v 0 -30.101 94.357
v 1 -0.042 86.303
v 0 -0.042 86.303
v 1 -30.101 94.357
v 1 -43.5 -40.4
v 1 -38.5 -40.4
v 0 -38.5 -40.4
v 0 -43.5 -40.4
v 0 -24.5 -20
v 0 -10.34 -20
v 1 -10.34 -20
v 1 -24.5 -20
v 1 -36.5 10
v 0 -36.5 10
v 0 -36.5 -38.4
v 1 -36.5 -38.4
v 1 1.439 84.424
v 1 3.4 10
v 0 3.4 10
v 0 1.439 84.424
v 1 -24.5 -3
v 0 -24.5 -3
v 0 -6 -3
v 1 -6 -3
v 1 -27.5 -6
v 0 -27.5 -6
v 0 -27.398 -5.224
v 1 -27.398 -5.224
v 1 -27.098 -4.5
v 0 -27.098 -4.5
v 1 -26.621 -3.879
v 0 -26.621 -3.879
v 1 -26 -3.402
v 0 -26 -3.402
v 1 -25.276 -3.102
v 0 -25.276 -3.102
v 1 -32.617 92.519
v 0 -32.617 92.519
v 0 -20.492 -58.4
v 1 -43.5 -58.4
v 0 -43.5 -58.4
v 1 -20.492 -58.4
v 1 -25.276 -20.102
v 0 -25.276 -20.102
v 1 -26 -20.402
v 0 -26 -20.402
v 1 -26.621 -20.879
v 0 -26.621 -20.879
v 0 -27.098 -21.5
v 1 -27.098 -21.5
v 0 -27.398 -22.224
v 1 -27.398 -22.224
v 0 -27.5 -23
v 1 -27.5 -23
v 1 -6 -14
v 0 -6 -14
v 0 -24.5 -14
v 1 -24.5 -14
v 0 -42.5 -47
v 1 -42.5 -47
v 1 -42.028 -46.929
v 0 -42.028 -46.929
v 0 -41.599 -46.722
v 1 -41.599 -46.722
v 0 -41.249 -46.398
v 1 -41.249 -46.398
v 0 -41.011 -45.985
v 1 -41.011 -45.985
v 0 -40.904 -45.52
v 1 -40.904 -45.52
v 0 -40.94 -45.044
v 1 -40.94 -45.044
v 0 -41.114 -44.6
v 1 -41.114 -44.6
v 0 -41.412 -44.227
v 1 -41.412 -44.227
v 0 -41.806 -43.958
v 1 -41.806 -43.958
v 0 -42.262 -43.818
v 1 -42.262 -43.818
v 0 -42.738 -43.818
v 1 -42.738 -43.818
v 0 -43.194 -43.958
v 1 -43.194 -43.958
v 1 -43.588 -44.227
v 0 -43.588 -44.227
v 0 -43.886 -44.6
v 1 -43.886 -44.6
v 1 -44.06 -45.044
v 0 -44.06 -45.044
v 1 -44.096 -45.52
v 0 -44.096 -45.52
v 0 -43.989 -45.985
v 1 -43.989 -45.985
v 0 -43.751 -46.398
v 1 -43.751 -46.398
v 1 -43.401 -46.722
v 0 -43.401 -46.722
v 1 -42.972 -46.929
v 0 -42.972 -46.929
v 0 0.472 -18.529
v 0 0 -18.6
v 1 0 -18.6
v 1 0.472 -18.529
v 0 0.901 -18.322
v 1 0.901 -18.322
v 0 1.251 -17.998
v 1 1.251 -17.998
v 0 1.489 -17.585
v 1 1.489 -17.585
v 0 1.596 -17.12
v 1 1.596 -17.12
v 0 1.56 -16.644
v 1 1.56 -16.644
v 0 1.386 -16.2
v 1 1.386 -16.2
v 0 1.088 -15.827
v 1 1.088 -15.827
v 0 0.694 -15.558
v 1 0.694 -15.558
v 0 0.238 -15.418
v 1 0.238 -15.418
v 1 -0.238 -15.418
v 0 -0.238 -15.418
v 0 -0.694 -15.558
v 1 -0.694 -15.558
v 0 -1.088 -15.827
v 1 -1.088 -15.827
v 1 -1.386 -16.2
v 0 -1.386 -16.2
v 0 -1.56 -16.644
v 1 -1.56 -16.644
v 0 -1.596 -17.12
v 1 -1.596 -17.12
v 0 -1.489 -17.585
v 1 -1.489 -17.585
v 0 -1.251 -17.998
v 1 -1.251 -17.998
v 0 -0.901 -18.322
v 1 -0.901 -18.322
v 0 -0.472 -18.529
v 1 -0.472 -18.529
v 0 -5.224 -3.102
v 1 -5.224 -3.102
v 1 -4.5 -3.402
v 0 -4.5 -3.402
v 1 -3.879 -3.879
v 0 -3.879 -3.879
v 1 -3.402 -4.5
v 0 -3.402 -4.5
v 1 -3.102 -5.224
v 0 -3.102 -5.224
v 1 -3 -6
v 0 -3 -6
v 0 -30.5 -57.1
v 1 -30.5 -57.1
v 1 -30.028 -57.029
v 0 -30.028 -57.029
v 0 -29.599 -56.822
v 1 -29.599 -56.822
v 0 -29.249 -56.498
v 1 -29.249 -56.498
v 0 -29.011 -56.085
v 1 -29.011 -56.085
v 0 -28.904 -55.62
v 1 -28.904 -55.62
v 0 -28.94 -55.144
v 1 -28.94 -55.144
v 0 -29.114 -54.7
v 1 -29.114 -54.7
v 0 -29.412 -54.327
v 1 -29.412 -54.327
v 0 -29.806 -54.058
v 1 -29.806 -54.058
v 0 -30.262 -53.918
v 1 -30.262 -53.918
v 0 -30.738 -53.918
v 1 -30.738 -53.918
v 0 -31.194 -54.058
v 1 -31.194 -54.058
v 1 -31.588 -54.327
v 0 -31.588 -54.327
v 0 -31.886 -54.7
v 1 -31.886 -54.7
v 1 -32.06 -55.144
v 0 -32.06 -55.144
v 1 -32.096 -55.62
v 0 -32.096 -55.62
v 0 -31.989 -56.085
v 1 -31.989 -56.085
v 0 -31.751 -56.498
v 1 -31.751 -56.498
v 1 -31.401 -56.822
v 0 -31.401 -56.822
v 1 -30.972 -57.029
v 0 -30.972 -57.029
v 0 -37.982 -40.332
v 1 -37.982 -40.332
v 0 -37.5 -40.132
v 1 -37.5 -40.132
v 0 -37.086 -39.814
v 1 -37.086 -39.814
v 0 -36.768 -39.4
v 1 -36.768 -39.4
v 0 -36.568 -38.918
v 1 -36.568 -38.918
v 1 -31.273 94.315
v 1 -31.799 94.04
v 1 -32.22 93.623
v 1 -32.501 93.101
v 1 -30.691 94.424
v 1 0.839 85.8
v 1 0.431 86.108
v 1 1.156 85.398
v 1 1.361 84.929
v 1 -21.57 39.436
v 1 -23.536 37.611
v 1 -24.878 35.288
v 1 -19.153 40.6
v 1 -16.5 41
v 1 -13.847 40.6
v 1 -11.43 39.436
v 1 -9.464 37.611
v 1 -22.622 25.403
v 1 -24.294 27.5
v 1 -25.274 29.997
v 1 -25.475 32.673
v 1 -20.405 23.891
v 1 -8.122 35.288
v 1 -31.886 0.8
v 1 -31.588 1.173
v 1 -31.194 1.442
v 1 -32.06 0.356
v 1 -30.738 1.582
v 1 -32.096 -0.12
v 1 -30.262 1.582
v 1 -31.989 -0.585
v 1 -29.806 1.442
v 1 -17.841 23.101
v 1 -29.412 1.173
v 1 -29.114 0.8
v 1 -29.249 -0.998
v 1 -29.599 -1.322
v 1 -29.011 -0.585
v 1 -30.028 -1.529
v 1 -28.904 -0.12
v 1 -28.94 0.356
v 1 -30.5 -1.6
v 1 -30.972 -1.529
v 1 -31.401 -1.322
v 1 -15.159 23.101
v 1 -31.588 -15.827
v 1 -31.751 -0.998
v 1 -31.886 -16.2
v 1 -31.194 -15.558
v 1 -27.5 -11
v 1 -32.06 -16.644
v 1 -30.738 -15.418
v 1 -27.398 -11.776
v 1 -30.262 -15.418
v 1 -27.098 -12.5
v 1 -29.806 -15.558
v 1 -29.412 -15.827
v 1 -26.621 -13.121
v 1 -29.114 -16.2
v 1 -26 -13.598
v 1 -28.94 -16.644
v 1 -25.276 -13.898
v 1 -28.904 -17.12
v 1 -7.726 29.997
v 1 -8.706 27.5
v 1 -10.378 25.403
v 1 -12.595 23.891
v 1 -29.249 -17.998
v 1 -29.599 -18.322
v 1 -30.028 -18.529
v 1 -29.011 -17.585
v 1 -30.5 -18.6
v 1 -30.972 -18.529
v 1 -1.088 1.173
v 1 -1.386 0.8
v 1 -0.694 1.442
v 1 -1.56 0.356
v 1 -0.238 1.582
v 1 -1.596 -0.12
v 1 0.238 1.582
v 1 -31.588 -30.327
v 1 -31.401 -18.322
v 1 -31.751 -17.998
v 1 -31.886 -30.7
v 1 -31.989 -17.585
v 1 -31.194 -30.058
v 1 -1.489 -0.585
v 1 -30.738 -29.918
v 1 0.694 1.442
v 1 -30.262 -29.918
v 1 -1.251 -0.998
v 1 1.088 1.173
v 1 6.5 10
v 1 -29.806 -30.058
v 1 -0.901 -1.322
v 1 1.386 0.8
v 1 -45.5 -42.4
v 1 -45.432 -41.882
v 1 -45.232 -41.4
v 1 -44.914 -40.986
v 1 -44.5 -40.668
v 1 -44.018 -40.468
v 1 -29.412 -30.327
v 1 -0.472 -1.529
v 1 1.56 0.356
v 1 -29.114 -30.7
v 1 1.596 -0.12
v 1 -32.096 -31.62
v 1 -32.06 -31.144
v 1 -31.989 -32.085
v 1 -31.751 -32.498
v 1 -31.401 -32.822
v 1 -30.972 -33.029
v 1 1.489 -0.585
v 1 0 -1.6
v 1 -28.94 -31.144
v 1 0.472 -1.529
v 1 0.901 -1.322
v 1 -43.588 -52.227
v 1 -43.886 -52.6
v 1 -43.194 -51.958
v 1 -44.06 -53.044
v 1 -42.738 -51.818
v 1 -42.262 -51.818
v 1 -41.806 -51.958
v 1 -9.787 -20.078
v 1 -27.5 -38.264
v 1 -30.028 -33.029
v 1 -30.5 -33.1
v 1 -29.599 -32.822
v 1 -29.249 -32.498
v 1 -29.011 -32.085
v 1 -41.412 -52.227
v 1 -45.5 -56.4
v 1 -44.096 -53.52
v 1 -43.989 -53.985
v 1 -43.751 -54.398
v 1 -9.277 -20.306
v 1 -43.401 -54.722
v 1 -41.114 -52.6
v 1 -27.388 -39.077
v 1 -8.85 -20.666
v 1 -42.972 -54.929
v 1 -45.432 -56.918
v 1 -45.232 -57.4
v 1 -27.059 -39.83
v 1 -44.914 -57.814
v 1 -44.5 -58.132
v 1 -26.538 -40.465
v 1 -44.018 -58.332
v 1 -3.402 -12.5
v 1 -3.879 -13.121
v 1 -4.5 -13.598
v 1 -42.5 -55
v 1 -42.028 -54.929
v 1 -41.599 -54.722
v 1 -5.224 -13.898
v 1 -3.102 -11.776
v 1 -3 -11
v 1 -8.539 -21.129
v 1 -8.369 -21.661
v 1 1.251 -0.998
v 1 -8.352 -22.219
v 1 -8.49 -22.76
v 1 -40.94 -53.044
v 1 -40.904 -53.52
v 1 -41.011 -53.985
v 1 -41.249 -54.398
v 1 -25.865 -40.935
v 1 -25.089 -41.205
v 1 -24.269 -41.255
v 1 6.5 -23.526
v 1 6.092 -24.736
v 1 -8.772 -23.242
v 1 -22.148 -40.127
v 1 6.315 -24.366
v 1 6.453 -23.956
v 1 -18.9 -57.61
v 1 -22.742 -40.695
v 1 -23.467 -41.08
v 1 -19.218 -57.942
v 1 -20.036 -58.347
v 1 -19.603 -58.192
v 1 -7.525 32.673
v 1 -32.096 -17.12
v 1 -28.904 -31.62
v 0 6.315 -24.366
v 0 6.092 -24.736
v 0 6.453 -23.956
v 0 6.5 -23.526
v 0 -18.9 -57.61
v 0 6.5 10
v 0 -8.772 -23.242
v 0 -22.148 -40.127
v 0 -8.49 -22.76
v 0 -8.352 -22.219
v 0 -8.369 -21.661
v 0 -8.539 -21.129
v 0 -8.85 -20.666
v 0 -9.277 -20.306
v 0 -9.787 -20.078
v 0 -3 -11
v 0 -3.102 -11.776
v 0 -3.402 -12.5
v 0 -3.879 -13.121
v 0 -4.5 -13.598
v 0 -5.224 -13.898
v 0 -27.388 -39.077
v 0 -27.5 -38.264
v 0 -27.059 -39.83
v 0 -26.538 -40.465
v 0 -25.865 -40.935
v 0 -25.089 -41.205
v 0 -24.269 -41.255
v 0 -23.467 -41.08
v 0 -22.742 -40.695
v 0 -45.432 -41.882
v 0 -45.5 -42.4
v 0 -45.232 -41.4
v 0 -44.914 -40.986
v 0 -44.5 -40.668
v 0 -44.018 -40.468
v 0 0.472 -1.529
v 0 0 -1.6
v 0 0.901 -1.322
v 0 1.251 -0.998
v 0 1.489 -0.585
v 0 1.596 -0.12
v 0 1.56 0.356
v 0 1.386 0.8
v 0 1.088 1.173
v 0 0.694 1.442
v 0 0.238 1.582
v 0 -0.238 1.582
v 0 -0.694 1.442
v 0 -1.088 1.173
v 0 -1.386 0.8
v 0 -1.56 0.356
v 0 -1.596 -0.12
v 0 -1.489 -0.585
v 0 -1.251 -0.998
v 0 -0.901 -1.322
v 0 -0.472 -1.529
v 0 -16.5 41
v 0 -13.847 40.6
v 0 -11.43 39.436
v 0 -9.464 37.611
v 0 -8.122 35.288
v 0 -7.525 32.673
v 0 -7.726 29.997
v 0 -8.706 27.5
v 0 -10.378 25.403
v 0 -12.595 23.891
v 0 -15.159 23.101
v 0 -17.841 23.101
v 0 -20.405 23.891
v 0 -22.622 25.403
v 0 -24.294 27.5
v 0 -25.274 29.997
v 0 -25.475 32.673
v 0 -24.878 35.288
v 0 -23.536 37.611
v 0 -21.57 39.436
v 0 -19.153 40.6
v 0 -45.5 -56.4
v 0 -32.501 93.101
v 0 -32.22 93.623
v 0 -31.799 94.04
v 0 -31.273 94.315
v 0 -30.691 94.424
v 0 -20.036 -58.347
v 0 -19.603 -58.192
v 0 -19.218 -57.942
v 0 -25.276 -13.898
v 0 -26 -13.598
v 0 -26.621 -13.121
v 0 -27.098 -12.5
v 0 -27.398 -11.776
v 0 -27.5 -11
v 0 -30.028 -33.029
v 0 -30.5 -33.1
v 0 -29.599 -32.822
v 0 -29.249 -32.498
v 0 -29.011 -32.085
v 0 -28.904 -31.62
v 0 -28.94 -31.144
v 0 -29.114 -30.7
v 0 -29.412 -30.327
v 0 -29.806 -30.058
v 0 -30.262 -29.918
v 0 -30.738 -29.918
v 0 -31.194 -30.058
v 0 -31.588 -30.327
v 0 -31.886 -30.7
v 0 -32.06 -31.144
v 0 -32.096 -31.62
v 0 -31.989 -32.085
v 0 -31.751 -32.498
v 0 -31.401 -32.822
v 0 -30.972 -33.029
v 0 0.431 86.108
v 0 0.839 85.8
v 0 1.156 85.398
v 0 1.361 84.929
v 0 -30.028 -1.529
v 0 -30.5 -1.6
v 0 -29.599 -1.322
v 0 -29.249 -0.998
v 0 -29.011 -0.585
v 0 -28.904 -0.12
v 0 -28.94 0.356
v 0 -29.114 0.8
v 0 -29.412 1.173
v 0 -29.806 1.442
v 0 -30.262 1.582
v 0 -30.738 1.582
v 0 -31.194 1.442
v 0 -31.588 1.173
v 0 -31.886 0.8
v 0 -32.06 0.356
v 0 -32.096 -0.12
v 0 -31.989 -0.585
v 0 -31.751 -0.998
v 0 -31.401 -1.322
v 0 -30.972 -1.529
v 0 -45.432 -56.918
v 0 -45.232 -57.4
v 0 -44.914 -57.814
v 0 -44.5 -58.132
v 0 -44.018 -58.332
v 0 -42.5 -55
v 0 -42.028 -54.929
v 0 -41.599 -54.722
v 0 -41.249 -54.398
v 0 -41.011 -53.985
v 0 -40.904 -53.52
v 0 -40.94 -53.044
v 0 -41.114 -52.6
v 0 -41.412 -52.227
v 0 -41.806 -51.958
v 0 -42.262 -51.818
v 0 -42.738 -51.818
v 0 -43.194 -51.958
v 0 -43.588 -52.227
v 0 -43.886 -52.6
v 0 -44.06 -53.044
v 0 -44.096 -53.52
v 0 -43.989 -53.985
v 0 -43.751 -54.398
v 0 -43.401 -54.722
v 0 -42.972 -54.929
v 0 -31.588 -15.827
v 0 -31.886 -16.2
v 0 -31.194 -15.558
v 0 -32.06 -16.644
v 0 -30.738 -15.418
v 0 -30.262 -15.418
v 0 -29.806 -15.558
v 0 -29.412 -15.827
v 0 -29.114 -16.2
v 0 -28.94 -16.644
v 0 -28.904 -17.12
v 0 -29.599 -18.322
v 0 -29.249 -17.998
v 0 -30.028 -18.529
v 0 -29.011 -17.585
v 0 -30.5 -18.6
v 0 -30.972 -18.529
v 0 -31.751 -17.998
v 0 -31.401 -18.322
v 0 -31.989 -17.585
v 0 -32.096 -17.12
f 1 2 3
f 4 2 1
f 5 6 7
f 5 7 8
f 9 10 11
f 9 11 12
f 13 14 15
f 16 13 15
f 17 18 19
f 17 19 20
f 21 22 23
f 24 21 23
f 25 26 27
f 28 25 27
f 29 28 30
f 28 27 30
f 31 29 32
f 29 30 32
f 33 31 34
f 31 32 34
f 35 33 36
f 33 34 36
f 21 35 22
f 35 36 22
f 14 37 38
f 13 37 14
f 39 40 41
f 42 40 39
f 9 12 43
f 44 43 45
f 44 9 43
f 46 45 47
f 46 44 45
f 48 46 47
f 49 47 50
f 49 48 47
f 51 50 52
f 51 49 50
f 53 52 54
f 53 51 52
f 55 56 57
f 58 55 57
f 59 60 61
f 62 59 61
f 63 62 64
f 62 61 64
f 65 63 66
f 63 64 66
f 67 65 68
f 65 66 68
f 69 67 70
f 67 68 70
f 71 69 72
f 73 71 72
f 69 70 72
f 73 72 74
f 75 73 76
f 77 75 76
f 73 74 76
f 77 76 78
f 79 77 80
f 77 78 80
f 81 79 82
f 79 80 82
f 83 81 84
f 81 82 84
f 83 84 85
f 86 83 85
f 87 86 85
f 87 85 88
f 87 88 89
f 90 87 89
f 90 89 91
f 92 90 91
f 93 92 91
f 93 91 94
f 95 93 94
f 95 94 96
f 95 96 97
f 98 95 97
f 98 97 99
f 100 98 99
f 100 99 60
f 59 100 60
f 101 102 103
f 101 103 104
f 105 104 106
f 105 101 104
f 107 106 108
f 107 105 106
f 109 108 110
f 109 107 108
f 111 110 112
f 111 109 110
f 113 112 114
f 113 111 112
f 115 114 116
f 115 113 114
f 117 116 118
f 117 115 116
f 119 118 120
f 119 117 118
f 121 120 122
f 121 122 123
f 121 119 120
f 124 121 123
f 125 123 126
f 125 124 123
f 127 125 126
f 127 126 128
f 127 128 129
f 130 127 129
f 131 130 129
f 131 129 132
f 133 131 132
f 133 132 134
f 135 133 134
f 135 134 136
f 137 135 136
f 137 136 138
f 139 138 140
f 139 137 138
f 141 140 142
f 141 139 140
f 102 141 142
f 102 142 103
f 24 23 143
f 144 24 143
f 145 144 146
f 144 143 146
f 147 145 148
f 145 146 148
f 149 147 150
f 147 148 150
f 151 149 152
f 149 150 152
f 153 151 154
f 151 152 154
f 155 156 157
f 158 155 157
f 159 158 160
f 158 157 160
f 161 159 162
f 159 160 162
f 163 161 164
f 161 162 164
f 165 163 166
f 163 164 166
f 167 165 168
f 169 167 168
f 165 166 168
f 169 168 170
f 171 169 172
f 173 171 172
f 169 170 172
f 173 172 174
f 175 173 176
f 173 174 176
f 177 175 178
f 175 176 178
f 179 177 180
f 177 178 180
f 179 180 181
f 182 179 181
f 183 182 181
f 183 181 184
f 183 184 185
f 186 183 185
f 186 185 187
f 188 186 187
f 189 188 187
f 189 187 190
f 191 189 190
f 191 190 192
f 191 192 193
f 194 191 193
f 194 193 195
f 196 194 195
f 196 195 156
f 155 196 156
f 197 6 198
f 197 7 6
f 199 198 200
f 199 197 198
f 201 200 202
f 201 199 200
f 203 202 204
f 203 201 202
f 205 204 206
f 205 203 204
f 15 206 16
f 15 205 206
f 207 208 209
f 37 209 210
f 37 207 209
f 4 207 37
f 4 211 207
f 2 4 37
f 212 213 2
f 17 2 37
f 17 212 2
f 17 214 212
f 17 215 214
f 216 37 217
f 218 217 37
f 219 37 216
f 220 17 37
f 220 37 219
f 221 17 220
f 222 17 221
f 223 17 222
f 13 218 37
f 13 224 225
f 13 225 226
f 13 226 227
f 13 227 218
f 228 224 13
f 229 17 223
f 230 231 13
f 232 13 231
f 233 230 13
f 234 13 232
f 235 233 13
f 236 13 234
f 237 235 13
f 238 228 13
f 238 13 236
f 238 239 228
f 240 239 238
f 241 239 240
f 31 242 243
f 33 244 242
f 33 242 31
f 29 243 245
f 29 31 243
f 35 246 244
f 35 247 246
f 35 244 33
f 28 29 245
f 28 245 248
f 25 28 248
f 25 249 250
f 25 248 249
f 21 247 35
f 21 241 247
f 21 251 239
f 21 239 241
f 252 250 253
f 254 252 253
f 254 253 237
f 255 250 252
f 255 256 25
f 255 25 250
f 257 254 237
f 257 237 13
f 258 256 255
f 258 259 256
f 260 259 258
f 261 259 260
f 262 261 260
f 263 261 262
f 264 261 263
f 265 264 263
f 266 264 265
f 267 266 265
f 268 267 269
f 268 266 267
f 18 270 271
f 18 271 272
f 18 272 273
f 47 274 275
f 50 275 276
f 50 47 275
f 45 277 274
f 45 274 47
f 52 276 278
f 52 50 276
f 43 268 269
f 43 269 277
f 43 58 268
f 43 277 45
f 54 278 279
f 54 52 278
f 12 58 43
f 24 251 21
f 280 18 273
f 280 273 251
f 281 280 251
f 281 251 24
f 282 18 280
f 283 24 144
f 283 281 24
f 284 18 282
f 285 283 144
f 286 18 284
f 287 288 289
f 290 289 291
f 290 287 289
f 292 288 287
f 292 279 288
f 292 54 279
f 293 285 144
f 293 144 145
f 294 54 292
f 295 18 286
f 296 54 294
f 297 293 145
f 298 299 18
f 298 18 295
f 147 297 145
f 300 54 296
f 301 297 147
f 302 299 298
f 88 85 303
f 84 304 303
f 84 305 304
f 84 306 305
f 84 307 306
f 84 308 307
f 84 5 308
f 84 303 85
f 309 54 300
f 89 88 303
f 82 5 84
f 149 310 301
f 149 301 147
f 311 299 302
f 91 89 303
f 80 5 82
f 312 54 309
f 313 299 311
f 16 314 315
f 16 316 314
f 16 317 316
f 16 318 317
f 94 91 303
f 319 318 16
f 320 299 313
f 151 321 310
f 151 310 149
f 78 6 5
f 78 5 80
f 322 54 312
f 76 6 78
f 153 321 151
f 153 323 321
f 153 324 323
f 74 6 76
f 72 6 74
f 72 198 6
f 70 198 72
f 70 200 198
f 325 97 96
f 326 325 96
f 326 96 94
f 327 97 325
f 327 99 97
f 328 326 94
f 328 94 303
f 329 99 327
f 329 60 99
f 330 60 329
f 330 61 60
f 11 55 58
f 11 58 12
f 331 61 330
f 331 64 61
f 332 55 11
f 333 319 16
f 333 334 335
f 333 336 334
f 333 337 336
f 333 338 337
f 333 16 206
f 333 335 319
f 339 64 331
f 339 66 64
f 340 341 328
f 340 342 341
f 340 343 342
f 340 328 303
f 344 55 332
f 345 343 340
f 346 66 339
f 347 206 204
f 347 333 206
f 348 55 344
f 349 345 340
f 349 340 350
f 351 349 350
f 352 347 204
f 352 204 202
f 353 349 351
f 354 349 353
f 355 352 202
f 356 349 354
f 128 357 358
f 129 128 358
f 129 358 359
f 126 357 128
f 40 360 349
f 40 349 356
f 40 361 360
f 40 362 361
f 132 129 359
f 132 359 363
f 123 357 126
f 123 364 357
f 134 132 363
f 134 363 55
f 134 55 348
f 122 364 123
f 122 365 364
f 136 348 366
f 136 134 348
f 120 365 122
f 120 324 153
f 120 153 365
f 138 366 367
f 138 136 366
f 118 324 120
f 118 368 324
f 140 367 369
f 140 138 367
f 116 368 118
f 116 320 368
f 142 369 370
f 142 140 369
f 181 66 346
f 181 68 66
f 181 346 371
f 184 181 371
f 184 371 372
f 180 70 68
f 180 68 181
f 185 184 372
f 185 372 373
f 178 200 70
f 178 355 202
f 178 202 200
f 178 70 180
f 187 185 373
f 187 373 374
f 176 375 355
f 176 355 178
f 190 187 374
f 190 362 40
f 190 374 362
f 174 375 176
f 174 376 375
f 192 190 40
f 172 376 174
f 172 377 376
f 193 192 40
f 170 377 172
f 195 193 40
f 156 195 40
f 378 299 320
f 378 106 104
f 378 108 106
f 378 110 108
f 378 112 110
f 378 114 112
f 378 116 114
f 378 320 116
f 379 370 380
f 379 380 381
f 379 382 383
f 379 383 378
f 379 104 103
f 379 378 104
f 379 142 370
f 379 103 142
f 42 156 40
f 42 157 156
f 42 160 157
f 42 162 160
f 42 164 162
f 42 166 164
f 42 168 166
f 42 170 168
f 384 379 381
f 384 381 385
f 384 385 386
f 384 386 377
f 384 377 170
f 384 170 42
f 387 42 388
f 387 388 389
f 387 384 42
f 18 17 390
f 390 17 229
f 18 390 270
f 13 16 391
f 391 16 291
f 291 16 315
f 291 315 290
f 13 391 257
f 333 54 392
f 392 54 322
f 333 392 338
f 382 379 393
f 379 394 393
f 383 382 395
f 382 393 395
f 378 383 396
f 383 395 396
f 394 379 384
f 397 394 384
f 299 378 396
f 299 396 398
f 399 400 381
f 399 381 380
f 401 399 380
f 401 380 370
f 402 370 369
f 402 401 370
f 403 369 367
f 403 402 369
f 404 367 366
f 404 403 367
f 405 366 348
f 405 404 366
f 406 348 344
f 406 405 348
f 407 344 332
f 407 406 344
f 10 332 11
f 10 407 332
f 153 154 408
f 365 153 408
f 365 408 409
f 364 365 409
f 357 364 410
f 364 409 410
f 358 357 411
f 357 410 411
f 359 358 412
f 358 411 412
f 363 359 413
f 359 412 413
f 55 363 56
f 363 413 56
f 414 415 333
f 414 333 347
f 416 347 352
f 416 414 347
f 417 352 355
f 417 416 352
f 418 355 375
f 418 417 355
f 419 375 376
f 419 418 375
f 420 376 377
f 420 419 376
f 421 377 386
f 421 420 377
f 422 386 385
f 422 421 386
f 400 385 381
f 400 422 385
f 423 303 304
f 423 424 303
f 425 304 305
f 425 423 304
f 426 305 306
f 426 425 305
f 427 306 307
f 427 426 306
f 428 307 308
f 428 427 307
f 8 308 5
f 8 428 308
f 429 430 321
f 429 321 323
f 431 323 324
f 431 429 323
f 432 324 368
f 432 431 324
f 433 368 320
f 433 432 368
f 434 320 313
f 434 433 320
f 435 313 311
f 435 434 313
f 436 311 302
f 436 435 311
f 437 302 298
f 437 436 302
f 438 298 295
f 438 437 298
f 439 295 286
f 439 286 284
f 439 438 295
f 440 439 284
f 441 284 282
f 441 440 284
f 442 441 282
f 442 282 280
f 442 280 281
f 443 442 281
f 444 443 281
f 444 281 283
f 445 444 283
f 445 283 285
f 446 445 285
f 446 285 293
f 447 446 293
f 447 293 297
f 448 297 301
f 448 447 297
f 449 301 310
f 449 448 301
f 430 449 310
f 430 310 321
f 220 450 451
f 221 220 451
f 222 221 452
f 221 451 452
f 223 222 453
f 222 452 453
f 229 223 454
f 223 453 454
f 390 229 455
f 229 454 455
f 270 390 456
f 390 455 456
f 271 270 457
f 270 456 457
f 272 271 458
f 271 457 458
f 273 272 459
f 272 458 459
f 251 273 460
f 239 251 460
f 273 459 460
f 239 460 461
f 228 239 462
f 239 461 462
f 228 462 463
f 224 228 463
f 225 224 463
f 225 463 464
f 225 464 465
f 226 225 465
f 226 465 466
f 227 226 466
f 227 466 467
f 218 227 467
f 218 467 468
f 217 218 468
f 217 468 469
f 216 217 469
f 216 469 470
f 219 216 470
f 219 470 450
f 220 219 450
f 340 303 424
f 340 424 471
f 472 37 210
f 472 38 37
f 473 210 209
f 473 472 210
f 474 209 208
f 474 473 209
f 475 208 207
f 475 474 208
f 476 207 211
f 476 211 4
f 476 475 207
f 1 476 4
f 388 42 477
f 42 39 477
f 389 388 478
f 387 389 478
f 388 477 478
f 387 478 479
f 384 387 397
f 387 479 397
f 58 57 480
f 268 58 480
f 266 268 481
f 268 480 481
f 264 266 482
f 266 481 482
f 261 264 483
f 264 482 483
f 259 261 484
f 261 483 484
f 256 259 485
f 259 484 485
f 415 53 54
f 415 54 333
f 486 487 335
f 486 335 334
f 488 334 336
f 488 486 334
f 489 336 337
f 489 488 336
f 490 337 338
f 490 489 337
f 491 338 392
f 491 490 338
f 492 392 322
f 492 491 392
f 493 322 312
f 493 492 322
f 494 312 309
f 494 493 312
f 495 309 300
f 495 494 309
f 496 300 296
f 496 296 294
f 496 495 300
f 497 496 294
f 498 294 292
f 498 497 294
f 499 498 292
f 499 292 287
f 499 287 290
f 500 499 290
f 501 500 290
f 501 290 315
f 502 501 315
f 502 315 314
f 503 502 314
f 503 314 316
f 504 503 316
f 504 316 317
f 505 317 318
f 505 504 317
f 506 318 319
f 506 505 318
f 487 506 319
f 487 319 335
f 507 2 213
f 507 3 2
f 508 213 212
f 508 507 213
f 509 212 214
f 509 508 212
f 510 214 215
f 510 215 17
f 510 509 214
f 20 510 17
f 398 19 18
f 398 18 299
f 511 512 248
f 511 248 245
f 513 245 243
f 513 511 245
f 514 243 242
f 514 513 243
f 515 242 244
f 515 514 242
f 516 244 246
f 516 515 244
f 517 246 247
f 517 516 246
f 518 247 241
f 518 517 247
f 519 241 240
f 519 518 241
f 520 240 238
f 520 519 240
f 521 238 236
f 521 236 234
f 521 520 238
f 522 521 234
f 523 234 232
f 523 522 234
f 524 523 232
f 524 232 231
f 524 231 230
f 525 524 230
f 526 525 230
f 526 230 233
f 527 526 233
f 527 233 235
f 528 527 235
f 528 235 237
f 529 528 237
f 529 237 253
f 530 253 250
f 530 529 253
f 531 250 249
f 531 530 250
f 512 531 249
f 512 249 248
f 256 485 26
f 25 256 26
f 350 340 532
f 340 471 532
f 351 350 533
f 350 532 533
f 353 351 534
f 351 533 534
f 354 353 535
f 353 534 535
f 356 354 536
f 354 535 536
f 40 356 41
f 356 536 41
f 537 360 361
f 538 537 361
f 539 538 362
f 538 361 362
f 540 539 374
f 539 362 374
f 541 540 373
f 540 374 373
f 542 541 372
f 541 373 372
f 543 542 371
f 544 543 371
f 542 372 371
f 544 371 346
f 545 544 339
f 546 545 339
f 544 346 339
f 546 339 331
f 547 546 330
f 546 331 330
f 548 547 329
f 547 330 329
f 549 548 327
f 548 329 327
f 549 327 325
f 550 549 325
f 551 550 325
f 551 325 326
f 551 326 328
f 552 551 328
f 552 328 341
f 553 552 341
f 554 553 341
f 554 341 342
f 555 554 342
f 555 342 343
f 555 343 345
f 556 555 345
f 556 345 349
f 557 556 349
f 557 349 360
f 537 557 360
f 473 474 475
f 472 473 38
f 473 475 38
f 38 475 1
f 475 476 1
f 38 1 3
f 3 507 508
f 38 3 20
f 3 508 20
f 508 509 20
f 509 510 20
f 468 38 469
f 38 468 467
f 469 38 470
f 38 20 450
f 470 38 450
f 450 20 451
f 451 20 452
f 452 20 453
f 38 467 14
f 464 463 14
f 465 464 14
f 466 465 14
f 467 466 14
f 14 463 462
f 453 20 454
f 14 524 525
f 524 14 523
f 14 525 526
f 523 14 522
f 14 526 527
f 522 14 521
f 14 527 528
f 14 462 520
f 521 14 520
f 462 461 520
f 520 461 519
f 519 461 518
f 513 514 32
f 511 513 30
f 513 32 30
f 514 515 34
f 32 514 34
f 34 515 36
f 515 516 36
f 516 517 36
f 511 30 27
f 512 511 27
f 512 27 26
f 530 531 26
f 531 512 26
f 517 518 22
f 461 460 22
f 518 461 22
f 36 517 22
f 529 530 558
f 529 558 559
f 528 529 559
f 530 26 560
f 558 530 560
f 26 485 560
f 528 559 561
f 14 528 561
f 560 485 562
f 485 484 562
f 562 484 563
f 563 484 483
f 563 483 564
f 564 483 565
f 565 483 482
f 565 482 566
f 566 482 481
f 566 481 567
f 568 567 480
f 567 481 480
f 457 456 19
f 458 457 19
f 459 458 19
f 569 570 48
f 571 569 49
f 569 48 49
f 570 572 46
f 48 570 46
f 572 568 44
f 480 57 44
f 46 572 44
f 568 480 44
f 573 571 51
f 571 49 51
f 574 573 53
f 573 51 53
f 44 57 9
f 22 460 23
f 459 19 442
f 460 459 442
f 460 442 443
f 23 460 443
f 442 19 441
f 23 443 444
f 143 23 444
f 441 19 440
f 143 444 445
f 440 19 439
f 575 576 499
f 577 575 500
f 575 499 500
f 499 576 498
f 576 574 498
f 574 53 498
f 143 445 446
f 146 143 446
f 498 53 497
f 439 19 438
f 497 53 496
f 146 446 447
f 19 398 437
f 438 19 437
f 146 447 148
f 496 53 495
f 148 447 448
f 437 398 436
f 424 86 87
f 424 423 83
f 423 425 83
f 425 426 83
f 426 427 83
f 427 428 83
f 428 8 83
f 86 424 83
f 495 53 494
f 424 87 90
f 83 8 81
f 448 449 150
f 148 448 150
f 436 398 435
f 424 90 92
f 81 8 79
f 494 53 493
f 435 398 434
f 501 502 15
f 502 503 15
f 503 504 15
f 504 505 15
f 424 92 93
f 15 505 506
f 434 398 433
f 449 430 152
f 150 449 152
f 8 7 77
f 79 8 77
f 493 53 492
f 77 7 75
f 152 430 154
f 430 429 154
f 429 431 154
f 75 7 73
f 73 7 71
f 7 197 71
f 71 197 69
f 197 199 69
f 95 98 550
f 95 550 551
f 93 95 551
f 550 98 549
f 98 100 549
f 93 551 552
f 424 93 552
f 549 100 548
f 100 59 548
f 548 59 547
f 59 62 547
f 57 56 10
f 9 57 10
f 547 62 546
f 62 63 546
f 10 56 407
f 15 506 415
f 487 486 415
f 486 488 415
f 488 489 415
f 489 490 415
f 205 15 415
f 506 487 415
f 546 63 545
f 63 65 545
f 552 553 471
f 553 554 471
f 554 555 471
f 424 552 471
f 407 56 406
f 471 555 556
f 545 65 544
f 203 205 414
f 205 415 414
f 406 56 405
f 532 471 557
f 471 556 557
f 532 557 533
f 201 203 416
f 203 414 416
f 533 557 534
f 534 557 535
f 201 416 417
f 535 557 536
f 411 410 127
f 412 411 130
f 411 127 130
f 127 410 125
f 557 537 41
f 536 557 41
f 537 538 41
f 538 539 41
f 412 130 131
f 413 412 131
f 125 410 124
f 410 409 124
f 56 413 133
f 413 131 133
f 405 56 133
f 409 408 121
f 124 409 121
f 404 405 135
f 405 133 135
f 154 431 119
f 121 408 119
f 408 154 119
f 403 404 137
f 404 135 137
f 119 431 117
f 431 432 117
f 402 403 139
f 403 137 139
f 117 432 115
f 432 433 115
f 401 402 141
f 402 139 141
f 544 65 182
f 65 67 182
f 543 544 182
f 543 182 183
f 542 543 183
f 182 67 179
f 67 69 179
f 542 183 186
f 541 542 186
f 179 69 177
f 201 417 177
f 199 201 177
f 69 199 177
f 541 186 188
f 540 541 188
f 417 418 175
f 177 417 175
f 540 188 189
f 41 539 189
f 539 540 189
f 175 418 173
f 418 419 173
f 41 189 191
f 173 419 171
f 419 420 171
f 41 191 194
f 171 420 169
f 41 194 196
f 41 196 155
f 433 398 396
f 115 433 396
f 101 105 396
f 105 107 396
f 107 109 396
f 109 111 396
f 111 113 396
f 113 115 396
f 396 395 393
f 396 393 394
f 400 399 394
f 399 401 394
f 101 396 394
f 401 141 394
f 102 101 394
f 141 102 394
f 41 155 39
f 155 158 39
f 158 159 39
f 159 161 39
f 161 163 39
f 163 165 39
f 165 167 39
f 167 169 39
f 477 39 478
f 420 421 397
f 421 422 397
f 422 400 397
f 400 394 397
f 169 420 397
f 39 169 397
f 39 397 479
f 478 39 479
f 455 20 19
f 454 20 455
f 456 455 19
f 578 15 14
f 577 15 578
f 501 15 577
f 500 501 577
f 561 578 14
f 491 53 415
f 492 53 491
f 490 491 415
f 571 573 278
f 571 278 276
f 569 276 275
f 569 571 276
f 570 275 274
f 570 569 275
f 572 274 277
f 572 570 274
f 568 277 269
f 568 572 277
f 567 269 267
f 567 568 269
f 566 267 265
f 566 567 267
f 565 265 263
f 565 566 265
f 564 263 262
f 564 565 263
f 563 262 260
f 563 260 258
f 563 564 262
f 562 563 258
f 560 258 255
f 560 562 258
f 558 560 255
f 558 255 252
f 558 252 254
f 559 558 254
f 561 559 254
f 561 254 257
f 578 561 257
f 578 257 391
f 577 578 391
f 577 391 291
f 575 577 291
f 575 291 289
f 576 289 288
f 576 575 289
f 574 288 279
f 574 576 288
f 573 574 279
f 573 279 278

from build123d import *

# Parameters (mm, degrees)
SKETCH_1_W               = 58
SKETCH_1_H               = 44
SKETCH_1_R               = 1.6
EXTRUDE_1_DEPTH          = 1
SKETCH_2_W               = 132.5
SKETCH_2_H               = 90
EXTRUDE_2_DEPTH          = 1
SKETCH_6_W               = 15
SKETCH_6_H               = 90
CUT_EXTRUDE_4_DEPTH      = 1
CUT_EXTRUDE_4_DEPTH_BACK = 2
CUT_EXTRUDE_6_DEPTH      = 2
EXTRUDE_3_DEPTH          = 1
EXTRUDE_4_DEPTH          = 1
SKETCH_11_R              = 1.6
CUT_EXTRUDE_7_DEPTH      = 2
CUT_EXTRUDE_8_DEPTH      = 2
FILLET_3_R               = 2
SKETCH_14_R              = 1.6
CUT_EXTRUDE_9_DEPTH      = 2
SKETCH_15_R              = 9
CUT_EXTRUDE_10_DEPTH     = 2
CUT_EXTRUDE_11_DEPTH     = 2


with BuildPart() as part:
    # 草图1 → 凸台-拉伸1 (new body)
    with BuildSketch(Plane(origin=(0, 0, 0), x_dir=(0, 0, -1), z_dir=(1, 0, 0))):
        with Locations((19, -14.5)):
            Rectangle(SKETCH_1_W, SKETCH_1_H)
        Circle(SKETCH_1_R, mode=Mode.SUBTRACT)
        with Locations((17, 0)):
            Circle(SKETCH_1_R, mode=Mode.SUBTRACT)
        with Locations((0, -30.5)):
            Circle(SKETCH_1_R, mode=Mode.SUBTRACT)
        with Locations((17, -30.5)):
            Circle(SKETCH_1_R, mode=Mode.SUBTRACT)
        with Locations((31.5, -30.5)):
            Circle(SKETCH_1_R, mode=Mode.SUBTRACT)
    extrude(amount=EXTRUDE_1_DEPTH)

    # 草图2 → 凸台-拉伸2 (add)
    with BuildSketch(Plane(origin=(1, 0, 0), x_dir=(0, 0, -1), z_dir=(1, 0, 0))):
        with Locations((-18.25, 52.5)):
            Rectangle(SKETCH_2_W, SKETCH_2_H)
    extrude(amount=-EXTRUDE_2_DEPTH)

    # 草图6 → 切除-拉伸4 (cut, two sides)
    with BuildSketch(Plane(origin=(1, 0, 0), x_dir=(0, 0, -1), z_dir=(1, 0, 0))) as cut_extrude_4_sk:
        with Locations((40.5, 52.5)):
            Rectangle(SKETCH_6_W, SKETCH_6_H)
    extrude(amount=CUT_EXTRUDE_4_DEPTH, mode=Mode.SUBTRACT)
    extrude(cut_extrude_4_sk.sketch, amount=-CUT_EXTRUDE_4_DEPTH_BACK, mode=Mode.SUBTRACT)

    # 草图8 → 切除-拉伸6 (cut, through all)
    with BuildSketch(Plane(origin=(1, 0, 0), x_dir=(0, 0, -1), z_dir=(1, 0, 0))):
        Polygon((-84.5, 7.5), (-10, 7.5), (-10, 6.5), (48, 6.5), (48, 7.5), (33, 7.5), (33, 97.5), (-84.5, 97.5), align=None)
    extrude(amount=-CUT_EXTRUDE_6_DEPTH, mode=Mode.SUBTRACT)

    # 草图9 → 凸台-拉伸3 (add)
    with BuildSketch(Plane(origin=(1, 0, 0), x_dir=(0, 0, -1), z_dir=(1, 0, 0))):
        Polygon((-10, -32.5), (-10, 3.4), (-85.916522377, 1.4), (-95, -32.5), (-10, -36.5), align=None)
    extrude(amount=-EXTRUDE_3_DEPTH)

    # 草图10 → 凸台-拉伸4 (add)
    with BuildSketch(Plane(origin=(1, 0, 0), x_dir=(0, 0, -1), z_dir=(1, 0, 0))):
        Polygon((40.4, -45.5), (58.4, -45.5), (58.4, 6.5), (48, 6.5), (48, -36.5), (40.4, -36.5), align=None)
    extrude(amount=-EXTRUDE_4_DEPTH)

    # 草图11 → 切除-拉伸7 (cut, through all)
    with BuildSketch(Plane(origin=(1, 0, 0), x_dir=(0, 0, -1), z_dir=(1, 0, 0))):
        with Locations((45.4, -42.5)):
            Circle(SKETCH_11_R)
        with Locations((53.4, -42.5)):
            Circle(SKETCH_11_R)
    extrude(amount=-CUT_EXTRUDE_7_DEPTH, mode=Mode.SUBTRACT)

    # 草图13 → 切除-拉伸8 (cut, through all)
    with BuildSketch(Plane(origin=(1, 0, 0), x_dir=(0, 0, -1), z_dir=(1, 0, 0))):
        Polygon((24.2, 6.5), (58.4, -19.5), (58.4, 6.5), align=None)
    extrude(amount=-CUT_EXTRUDE_8_DEPTH, mode=Mode.SUBTRACT)

    # 圆角3
    fillet_3_edges = [part.edges().sort_by_distance(p)[0] for p in [
        (0.5, -32.5, 95),
        (0.5, 1.4, 85.916522377),
        (0.5, -45.5, -58.4),
        (0.5, -45.5, -40.4),
        (0.5, -36.5, -40.4),
        (0.5, 6.5, -24.2),
        (0.5, -19.5, -58.4),
    ]]
    fillet(fillet_3_edges, radius=FILLET_3_R)

    # 草图14 → 切除-拉伸9 (cut, through all)
    with BuildSketch(Plane(origin=(1, 0, 0), x_dir=(0, 0, -1), z_dir=(1, 0, 0))):
        with Locations((55.5, -30.5)):
            Circle(SKETCH_14_R)
    extrude(amount=-CUT_EXTRUDE_9_DEPTH, mode=Mode.SUBTRACT)

    # 草图15 → 切除-拉伸10 (cut, through all)
    with BuildSketch(Plane.ZY):
        with Locations((32, -16.5)):
            Circle(SKETCH_15_R)
    extrude(amount=-CUT_EXTRUDE_10_DEPTH, mode=Mode.SUBTRACT)

    # 草图16 → 切除-拉伸11 (cut, through all)
    with BuildSketch(Plane.ZY):
        with BuildLine():
            Line((-40.126719129, -22.148481915), (-23.2419273, -8.772218258))
            ThreePointArc((-23.2419273, -8.772218258), (-21.129326296, -8.5393617), (-20, -10.339896982))
            Line((-20, -10.339896982), (-20, -24.5))
            ThreePointArc((-20, -24.5), (-20.878679656, -26.621320344), (-23, -27.5))
            Line((-23, -27.5), (-31.5, -27.5))
            Line((-31.5, -27.5), (-38.263828178, -27.5))
            ThreePointArc((-38.263828178, -27.5), (-41.09707316, -25.48626714), (-40.126719129, -22.148481915))
        make_face()
        with BuildLine():
            Line((-14, -6), (-14, -24.5))
            ThreePointArc((-14, -24.5), (-13.121320344, -26.621320344), (-11, -27.5))
            Line((-11, -27.5), (-6, -27.5))
            ThreePointArc((-6, -27.5), (-3.878679656, -26.621320344), (-3, -24.5))
            Line((-3, -24.5), (-3, -6))
            ThreePointArc((-3, -6), (-3.878679656, -3.878679656), (-6, -3))
            Line((-6, -3), (-11, -3))
            ThreePointArc((-11, -3), (-13.121320344, -3.878679656), (-14, -6))
        make_face()
    extrude(amount=-CUT_EXTRUDE_11_DEPTH, mode=Mode.SUBTRACT)


solid = part.part
